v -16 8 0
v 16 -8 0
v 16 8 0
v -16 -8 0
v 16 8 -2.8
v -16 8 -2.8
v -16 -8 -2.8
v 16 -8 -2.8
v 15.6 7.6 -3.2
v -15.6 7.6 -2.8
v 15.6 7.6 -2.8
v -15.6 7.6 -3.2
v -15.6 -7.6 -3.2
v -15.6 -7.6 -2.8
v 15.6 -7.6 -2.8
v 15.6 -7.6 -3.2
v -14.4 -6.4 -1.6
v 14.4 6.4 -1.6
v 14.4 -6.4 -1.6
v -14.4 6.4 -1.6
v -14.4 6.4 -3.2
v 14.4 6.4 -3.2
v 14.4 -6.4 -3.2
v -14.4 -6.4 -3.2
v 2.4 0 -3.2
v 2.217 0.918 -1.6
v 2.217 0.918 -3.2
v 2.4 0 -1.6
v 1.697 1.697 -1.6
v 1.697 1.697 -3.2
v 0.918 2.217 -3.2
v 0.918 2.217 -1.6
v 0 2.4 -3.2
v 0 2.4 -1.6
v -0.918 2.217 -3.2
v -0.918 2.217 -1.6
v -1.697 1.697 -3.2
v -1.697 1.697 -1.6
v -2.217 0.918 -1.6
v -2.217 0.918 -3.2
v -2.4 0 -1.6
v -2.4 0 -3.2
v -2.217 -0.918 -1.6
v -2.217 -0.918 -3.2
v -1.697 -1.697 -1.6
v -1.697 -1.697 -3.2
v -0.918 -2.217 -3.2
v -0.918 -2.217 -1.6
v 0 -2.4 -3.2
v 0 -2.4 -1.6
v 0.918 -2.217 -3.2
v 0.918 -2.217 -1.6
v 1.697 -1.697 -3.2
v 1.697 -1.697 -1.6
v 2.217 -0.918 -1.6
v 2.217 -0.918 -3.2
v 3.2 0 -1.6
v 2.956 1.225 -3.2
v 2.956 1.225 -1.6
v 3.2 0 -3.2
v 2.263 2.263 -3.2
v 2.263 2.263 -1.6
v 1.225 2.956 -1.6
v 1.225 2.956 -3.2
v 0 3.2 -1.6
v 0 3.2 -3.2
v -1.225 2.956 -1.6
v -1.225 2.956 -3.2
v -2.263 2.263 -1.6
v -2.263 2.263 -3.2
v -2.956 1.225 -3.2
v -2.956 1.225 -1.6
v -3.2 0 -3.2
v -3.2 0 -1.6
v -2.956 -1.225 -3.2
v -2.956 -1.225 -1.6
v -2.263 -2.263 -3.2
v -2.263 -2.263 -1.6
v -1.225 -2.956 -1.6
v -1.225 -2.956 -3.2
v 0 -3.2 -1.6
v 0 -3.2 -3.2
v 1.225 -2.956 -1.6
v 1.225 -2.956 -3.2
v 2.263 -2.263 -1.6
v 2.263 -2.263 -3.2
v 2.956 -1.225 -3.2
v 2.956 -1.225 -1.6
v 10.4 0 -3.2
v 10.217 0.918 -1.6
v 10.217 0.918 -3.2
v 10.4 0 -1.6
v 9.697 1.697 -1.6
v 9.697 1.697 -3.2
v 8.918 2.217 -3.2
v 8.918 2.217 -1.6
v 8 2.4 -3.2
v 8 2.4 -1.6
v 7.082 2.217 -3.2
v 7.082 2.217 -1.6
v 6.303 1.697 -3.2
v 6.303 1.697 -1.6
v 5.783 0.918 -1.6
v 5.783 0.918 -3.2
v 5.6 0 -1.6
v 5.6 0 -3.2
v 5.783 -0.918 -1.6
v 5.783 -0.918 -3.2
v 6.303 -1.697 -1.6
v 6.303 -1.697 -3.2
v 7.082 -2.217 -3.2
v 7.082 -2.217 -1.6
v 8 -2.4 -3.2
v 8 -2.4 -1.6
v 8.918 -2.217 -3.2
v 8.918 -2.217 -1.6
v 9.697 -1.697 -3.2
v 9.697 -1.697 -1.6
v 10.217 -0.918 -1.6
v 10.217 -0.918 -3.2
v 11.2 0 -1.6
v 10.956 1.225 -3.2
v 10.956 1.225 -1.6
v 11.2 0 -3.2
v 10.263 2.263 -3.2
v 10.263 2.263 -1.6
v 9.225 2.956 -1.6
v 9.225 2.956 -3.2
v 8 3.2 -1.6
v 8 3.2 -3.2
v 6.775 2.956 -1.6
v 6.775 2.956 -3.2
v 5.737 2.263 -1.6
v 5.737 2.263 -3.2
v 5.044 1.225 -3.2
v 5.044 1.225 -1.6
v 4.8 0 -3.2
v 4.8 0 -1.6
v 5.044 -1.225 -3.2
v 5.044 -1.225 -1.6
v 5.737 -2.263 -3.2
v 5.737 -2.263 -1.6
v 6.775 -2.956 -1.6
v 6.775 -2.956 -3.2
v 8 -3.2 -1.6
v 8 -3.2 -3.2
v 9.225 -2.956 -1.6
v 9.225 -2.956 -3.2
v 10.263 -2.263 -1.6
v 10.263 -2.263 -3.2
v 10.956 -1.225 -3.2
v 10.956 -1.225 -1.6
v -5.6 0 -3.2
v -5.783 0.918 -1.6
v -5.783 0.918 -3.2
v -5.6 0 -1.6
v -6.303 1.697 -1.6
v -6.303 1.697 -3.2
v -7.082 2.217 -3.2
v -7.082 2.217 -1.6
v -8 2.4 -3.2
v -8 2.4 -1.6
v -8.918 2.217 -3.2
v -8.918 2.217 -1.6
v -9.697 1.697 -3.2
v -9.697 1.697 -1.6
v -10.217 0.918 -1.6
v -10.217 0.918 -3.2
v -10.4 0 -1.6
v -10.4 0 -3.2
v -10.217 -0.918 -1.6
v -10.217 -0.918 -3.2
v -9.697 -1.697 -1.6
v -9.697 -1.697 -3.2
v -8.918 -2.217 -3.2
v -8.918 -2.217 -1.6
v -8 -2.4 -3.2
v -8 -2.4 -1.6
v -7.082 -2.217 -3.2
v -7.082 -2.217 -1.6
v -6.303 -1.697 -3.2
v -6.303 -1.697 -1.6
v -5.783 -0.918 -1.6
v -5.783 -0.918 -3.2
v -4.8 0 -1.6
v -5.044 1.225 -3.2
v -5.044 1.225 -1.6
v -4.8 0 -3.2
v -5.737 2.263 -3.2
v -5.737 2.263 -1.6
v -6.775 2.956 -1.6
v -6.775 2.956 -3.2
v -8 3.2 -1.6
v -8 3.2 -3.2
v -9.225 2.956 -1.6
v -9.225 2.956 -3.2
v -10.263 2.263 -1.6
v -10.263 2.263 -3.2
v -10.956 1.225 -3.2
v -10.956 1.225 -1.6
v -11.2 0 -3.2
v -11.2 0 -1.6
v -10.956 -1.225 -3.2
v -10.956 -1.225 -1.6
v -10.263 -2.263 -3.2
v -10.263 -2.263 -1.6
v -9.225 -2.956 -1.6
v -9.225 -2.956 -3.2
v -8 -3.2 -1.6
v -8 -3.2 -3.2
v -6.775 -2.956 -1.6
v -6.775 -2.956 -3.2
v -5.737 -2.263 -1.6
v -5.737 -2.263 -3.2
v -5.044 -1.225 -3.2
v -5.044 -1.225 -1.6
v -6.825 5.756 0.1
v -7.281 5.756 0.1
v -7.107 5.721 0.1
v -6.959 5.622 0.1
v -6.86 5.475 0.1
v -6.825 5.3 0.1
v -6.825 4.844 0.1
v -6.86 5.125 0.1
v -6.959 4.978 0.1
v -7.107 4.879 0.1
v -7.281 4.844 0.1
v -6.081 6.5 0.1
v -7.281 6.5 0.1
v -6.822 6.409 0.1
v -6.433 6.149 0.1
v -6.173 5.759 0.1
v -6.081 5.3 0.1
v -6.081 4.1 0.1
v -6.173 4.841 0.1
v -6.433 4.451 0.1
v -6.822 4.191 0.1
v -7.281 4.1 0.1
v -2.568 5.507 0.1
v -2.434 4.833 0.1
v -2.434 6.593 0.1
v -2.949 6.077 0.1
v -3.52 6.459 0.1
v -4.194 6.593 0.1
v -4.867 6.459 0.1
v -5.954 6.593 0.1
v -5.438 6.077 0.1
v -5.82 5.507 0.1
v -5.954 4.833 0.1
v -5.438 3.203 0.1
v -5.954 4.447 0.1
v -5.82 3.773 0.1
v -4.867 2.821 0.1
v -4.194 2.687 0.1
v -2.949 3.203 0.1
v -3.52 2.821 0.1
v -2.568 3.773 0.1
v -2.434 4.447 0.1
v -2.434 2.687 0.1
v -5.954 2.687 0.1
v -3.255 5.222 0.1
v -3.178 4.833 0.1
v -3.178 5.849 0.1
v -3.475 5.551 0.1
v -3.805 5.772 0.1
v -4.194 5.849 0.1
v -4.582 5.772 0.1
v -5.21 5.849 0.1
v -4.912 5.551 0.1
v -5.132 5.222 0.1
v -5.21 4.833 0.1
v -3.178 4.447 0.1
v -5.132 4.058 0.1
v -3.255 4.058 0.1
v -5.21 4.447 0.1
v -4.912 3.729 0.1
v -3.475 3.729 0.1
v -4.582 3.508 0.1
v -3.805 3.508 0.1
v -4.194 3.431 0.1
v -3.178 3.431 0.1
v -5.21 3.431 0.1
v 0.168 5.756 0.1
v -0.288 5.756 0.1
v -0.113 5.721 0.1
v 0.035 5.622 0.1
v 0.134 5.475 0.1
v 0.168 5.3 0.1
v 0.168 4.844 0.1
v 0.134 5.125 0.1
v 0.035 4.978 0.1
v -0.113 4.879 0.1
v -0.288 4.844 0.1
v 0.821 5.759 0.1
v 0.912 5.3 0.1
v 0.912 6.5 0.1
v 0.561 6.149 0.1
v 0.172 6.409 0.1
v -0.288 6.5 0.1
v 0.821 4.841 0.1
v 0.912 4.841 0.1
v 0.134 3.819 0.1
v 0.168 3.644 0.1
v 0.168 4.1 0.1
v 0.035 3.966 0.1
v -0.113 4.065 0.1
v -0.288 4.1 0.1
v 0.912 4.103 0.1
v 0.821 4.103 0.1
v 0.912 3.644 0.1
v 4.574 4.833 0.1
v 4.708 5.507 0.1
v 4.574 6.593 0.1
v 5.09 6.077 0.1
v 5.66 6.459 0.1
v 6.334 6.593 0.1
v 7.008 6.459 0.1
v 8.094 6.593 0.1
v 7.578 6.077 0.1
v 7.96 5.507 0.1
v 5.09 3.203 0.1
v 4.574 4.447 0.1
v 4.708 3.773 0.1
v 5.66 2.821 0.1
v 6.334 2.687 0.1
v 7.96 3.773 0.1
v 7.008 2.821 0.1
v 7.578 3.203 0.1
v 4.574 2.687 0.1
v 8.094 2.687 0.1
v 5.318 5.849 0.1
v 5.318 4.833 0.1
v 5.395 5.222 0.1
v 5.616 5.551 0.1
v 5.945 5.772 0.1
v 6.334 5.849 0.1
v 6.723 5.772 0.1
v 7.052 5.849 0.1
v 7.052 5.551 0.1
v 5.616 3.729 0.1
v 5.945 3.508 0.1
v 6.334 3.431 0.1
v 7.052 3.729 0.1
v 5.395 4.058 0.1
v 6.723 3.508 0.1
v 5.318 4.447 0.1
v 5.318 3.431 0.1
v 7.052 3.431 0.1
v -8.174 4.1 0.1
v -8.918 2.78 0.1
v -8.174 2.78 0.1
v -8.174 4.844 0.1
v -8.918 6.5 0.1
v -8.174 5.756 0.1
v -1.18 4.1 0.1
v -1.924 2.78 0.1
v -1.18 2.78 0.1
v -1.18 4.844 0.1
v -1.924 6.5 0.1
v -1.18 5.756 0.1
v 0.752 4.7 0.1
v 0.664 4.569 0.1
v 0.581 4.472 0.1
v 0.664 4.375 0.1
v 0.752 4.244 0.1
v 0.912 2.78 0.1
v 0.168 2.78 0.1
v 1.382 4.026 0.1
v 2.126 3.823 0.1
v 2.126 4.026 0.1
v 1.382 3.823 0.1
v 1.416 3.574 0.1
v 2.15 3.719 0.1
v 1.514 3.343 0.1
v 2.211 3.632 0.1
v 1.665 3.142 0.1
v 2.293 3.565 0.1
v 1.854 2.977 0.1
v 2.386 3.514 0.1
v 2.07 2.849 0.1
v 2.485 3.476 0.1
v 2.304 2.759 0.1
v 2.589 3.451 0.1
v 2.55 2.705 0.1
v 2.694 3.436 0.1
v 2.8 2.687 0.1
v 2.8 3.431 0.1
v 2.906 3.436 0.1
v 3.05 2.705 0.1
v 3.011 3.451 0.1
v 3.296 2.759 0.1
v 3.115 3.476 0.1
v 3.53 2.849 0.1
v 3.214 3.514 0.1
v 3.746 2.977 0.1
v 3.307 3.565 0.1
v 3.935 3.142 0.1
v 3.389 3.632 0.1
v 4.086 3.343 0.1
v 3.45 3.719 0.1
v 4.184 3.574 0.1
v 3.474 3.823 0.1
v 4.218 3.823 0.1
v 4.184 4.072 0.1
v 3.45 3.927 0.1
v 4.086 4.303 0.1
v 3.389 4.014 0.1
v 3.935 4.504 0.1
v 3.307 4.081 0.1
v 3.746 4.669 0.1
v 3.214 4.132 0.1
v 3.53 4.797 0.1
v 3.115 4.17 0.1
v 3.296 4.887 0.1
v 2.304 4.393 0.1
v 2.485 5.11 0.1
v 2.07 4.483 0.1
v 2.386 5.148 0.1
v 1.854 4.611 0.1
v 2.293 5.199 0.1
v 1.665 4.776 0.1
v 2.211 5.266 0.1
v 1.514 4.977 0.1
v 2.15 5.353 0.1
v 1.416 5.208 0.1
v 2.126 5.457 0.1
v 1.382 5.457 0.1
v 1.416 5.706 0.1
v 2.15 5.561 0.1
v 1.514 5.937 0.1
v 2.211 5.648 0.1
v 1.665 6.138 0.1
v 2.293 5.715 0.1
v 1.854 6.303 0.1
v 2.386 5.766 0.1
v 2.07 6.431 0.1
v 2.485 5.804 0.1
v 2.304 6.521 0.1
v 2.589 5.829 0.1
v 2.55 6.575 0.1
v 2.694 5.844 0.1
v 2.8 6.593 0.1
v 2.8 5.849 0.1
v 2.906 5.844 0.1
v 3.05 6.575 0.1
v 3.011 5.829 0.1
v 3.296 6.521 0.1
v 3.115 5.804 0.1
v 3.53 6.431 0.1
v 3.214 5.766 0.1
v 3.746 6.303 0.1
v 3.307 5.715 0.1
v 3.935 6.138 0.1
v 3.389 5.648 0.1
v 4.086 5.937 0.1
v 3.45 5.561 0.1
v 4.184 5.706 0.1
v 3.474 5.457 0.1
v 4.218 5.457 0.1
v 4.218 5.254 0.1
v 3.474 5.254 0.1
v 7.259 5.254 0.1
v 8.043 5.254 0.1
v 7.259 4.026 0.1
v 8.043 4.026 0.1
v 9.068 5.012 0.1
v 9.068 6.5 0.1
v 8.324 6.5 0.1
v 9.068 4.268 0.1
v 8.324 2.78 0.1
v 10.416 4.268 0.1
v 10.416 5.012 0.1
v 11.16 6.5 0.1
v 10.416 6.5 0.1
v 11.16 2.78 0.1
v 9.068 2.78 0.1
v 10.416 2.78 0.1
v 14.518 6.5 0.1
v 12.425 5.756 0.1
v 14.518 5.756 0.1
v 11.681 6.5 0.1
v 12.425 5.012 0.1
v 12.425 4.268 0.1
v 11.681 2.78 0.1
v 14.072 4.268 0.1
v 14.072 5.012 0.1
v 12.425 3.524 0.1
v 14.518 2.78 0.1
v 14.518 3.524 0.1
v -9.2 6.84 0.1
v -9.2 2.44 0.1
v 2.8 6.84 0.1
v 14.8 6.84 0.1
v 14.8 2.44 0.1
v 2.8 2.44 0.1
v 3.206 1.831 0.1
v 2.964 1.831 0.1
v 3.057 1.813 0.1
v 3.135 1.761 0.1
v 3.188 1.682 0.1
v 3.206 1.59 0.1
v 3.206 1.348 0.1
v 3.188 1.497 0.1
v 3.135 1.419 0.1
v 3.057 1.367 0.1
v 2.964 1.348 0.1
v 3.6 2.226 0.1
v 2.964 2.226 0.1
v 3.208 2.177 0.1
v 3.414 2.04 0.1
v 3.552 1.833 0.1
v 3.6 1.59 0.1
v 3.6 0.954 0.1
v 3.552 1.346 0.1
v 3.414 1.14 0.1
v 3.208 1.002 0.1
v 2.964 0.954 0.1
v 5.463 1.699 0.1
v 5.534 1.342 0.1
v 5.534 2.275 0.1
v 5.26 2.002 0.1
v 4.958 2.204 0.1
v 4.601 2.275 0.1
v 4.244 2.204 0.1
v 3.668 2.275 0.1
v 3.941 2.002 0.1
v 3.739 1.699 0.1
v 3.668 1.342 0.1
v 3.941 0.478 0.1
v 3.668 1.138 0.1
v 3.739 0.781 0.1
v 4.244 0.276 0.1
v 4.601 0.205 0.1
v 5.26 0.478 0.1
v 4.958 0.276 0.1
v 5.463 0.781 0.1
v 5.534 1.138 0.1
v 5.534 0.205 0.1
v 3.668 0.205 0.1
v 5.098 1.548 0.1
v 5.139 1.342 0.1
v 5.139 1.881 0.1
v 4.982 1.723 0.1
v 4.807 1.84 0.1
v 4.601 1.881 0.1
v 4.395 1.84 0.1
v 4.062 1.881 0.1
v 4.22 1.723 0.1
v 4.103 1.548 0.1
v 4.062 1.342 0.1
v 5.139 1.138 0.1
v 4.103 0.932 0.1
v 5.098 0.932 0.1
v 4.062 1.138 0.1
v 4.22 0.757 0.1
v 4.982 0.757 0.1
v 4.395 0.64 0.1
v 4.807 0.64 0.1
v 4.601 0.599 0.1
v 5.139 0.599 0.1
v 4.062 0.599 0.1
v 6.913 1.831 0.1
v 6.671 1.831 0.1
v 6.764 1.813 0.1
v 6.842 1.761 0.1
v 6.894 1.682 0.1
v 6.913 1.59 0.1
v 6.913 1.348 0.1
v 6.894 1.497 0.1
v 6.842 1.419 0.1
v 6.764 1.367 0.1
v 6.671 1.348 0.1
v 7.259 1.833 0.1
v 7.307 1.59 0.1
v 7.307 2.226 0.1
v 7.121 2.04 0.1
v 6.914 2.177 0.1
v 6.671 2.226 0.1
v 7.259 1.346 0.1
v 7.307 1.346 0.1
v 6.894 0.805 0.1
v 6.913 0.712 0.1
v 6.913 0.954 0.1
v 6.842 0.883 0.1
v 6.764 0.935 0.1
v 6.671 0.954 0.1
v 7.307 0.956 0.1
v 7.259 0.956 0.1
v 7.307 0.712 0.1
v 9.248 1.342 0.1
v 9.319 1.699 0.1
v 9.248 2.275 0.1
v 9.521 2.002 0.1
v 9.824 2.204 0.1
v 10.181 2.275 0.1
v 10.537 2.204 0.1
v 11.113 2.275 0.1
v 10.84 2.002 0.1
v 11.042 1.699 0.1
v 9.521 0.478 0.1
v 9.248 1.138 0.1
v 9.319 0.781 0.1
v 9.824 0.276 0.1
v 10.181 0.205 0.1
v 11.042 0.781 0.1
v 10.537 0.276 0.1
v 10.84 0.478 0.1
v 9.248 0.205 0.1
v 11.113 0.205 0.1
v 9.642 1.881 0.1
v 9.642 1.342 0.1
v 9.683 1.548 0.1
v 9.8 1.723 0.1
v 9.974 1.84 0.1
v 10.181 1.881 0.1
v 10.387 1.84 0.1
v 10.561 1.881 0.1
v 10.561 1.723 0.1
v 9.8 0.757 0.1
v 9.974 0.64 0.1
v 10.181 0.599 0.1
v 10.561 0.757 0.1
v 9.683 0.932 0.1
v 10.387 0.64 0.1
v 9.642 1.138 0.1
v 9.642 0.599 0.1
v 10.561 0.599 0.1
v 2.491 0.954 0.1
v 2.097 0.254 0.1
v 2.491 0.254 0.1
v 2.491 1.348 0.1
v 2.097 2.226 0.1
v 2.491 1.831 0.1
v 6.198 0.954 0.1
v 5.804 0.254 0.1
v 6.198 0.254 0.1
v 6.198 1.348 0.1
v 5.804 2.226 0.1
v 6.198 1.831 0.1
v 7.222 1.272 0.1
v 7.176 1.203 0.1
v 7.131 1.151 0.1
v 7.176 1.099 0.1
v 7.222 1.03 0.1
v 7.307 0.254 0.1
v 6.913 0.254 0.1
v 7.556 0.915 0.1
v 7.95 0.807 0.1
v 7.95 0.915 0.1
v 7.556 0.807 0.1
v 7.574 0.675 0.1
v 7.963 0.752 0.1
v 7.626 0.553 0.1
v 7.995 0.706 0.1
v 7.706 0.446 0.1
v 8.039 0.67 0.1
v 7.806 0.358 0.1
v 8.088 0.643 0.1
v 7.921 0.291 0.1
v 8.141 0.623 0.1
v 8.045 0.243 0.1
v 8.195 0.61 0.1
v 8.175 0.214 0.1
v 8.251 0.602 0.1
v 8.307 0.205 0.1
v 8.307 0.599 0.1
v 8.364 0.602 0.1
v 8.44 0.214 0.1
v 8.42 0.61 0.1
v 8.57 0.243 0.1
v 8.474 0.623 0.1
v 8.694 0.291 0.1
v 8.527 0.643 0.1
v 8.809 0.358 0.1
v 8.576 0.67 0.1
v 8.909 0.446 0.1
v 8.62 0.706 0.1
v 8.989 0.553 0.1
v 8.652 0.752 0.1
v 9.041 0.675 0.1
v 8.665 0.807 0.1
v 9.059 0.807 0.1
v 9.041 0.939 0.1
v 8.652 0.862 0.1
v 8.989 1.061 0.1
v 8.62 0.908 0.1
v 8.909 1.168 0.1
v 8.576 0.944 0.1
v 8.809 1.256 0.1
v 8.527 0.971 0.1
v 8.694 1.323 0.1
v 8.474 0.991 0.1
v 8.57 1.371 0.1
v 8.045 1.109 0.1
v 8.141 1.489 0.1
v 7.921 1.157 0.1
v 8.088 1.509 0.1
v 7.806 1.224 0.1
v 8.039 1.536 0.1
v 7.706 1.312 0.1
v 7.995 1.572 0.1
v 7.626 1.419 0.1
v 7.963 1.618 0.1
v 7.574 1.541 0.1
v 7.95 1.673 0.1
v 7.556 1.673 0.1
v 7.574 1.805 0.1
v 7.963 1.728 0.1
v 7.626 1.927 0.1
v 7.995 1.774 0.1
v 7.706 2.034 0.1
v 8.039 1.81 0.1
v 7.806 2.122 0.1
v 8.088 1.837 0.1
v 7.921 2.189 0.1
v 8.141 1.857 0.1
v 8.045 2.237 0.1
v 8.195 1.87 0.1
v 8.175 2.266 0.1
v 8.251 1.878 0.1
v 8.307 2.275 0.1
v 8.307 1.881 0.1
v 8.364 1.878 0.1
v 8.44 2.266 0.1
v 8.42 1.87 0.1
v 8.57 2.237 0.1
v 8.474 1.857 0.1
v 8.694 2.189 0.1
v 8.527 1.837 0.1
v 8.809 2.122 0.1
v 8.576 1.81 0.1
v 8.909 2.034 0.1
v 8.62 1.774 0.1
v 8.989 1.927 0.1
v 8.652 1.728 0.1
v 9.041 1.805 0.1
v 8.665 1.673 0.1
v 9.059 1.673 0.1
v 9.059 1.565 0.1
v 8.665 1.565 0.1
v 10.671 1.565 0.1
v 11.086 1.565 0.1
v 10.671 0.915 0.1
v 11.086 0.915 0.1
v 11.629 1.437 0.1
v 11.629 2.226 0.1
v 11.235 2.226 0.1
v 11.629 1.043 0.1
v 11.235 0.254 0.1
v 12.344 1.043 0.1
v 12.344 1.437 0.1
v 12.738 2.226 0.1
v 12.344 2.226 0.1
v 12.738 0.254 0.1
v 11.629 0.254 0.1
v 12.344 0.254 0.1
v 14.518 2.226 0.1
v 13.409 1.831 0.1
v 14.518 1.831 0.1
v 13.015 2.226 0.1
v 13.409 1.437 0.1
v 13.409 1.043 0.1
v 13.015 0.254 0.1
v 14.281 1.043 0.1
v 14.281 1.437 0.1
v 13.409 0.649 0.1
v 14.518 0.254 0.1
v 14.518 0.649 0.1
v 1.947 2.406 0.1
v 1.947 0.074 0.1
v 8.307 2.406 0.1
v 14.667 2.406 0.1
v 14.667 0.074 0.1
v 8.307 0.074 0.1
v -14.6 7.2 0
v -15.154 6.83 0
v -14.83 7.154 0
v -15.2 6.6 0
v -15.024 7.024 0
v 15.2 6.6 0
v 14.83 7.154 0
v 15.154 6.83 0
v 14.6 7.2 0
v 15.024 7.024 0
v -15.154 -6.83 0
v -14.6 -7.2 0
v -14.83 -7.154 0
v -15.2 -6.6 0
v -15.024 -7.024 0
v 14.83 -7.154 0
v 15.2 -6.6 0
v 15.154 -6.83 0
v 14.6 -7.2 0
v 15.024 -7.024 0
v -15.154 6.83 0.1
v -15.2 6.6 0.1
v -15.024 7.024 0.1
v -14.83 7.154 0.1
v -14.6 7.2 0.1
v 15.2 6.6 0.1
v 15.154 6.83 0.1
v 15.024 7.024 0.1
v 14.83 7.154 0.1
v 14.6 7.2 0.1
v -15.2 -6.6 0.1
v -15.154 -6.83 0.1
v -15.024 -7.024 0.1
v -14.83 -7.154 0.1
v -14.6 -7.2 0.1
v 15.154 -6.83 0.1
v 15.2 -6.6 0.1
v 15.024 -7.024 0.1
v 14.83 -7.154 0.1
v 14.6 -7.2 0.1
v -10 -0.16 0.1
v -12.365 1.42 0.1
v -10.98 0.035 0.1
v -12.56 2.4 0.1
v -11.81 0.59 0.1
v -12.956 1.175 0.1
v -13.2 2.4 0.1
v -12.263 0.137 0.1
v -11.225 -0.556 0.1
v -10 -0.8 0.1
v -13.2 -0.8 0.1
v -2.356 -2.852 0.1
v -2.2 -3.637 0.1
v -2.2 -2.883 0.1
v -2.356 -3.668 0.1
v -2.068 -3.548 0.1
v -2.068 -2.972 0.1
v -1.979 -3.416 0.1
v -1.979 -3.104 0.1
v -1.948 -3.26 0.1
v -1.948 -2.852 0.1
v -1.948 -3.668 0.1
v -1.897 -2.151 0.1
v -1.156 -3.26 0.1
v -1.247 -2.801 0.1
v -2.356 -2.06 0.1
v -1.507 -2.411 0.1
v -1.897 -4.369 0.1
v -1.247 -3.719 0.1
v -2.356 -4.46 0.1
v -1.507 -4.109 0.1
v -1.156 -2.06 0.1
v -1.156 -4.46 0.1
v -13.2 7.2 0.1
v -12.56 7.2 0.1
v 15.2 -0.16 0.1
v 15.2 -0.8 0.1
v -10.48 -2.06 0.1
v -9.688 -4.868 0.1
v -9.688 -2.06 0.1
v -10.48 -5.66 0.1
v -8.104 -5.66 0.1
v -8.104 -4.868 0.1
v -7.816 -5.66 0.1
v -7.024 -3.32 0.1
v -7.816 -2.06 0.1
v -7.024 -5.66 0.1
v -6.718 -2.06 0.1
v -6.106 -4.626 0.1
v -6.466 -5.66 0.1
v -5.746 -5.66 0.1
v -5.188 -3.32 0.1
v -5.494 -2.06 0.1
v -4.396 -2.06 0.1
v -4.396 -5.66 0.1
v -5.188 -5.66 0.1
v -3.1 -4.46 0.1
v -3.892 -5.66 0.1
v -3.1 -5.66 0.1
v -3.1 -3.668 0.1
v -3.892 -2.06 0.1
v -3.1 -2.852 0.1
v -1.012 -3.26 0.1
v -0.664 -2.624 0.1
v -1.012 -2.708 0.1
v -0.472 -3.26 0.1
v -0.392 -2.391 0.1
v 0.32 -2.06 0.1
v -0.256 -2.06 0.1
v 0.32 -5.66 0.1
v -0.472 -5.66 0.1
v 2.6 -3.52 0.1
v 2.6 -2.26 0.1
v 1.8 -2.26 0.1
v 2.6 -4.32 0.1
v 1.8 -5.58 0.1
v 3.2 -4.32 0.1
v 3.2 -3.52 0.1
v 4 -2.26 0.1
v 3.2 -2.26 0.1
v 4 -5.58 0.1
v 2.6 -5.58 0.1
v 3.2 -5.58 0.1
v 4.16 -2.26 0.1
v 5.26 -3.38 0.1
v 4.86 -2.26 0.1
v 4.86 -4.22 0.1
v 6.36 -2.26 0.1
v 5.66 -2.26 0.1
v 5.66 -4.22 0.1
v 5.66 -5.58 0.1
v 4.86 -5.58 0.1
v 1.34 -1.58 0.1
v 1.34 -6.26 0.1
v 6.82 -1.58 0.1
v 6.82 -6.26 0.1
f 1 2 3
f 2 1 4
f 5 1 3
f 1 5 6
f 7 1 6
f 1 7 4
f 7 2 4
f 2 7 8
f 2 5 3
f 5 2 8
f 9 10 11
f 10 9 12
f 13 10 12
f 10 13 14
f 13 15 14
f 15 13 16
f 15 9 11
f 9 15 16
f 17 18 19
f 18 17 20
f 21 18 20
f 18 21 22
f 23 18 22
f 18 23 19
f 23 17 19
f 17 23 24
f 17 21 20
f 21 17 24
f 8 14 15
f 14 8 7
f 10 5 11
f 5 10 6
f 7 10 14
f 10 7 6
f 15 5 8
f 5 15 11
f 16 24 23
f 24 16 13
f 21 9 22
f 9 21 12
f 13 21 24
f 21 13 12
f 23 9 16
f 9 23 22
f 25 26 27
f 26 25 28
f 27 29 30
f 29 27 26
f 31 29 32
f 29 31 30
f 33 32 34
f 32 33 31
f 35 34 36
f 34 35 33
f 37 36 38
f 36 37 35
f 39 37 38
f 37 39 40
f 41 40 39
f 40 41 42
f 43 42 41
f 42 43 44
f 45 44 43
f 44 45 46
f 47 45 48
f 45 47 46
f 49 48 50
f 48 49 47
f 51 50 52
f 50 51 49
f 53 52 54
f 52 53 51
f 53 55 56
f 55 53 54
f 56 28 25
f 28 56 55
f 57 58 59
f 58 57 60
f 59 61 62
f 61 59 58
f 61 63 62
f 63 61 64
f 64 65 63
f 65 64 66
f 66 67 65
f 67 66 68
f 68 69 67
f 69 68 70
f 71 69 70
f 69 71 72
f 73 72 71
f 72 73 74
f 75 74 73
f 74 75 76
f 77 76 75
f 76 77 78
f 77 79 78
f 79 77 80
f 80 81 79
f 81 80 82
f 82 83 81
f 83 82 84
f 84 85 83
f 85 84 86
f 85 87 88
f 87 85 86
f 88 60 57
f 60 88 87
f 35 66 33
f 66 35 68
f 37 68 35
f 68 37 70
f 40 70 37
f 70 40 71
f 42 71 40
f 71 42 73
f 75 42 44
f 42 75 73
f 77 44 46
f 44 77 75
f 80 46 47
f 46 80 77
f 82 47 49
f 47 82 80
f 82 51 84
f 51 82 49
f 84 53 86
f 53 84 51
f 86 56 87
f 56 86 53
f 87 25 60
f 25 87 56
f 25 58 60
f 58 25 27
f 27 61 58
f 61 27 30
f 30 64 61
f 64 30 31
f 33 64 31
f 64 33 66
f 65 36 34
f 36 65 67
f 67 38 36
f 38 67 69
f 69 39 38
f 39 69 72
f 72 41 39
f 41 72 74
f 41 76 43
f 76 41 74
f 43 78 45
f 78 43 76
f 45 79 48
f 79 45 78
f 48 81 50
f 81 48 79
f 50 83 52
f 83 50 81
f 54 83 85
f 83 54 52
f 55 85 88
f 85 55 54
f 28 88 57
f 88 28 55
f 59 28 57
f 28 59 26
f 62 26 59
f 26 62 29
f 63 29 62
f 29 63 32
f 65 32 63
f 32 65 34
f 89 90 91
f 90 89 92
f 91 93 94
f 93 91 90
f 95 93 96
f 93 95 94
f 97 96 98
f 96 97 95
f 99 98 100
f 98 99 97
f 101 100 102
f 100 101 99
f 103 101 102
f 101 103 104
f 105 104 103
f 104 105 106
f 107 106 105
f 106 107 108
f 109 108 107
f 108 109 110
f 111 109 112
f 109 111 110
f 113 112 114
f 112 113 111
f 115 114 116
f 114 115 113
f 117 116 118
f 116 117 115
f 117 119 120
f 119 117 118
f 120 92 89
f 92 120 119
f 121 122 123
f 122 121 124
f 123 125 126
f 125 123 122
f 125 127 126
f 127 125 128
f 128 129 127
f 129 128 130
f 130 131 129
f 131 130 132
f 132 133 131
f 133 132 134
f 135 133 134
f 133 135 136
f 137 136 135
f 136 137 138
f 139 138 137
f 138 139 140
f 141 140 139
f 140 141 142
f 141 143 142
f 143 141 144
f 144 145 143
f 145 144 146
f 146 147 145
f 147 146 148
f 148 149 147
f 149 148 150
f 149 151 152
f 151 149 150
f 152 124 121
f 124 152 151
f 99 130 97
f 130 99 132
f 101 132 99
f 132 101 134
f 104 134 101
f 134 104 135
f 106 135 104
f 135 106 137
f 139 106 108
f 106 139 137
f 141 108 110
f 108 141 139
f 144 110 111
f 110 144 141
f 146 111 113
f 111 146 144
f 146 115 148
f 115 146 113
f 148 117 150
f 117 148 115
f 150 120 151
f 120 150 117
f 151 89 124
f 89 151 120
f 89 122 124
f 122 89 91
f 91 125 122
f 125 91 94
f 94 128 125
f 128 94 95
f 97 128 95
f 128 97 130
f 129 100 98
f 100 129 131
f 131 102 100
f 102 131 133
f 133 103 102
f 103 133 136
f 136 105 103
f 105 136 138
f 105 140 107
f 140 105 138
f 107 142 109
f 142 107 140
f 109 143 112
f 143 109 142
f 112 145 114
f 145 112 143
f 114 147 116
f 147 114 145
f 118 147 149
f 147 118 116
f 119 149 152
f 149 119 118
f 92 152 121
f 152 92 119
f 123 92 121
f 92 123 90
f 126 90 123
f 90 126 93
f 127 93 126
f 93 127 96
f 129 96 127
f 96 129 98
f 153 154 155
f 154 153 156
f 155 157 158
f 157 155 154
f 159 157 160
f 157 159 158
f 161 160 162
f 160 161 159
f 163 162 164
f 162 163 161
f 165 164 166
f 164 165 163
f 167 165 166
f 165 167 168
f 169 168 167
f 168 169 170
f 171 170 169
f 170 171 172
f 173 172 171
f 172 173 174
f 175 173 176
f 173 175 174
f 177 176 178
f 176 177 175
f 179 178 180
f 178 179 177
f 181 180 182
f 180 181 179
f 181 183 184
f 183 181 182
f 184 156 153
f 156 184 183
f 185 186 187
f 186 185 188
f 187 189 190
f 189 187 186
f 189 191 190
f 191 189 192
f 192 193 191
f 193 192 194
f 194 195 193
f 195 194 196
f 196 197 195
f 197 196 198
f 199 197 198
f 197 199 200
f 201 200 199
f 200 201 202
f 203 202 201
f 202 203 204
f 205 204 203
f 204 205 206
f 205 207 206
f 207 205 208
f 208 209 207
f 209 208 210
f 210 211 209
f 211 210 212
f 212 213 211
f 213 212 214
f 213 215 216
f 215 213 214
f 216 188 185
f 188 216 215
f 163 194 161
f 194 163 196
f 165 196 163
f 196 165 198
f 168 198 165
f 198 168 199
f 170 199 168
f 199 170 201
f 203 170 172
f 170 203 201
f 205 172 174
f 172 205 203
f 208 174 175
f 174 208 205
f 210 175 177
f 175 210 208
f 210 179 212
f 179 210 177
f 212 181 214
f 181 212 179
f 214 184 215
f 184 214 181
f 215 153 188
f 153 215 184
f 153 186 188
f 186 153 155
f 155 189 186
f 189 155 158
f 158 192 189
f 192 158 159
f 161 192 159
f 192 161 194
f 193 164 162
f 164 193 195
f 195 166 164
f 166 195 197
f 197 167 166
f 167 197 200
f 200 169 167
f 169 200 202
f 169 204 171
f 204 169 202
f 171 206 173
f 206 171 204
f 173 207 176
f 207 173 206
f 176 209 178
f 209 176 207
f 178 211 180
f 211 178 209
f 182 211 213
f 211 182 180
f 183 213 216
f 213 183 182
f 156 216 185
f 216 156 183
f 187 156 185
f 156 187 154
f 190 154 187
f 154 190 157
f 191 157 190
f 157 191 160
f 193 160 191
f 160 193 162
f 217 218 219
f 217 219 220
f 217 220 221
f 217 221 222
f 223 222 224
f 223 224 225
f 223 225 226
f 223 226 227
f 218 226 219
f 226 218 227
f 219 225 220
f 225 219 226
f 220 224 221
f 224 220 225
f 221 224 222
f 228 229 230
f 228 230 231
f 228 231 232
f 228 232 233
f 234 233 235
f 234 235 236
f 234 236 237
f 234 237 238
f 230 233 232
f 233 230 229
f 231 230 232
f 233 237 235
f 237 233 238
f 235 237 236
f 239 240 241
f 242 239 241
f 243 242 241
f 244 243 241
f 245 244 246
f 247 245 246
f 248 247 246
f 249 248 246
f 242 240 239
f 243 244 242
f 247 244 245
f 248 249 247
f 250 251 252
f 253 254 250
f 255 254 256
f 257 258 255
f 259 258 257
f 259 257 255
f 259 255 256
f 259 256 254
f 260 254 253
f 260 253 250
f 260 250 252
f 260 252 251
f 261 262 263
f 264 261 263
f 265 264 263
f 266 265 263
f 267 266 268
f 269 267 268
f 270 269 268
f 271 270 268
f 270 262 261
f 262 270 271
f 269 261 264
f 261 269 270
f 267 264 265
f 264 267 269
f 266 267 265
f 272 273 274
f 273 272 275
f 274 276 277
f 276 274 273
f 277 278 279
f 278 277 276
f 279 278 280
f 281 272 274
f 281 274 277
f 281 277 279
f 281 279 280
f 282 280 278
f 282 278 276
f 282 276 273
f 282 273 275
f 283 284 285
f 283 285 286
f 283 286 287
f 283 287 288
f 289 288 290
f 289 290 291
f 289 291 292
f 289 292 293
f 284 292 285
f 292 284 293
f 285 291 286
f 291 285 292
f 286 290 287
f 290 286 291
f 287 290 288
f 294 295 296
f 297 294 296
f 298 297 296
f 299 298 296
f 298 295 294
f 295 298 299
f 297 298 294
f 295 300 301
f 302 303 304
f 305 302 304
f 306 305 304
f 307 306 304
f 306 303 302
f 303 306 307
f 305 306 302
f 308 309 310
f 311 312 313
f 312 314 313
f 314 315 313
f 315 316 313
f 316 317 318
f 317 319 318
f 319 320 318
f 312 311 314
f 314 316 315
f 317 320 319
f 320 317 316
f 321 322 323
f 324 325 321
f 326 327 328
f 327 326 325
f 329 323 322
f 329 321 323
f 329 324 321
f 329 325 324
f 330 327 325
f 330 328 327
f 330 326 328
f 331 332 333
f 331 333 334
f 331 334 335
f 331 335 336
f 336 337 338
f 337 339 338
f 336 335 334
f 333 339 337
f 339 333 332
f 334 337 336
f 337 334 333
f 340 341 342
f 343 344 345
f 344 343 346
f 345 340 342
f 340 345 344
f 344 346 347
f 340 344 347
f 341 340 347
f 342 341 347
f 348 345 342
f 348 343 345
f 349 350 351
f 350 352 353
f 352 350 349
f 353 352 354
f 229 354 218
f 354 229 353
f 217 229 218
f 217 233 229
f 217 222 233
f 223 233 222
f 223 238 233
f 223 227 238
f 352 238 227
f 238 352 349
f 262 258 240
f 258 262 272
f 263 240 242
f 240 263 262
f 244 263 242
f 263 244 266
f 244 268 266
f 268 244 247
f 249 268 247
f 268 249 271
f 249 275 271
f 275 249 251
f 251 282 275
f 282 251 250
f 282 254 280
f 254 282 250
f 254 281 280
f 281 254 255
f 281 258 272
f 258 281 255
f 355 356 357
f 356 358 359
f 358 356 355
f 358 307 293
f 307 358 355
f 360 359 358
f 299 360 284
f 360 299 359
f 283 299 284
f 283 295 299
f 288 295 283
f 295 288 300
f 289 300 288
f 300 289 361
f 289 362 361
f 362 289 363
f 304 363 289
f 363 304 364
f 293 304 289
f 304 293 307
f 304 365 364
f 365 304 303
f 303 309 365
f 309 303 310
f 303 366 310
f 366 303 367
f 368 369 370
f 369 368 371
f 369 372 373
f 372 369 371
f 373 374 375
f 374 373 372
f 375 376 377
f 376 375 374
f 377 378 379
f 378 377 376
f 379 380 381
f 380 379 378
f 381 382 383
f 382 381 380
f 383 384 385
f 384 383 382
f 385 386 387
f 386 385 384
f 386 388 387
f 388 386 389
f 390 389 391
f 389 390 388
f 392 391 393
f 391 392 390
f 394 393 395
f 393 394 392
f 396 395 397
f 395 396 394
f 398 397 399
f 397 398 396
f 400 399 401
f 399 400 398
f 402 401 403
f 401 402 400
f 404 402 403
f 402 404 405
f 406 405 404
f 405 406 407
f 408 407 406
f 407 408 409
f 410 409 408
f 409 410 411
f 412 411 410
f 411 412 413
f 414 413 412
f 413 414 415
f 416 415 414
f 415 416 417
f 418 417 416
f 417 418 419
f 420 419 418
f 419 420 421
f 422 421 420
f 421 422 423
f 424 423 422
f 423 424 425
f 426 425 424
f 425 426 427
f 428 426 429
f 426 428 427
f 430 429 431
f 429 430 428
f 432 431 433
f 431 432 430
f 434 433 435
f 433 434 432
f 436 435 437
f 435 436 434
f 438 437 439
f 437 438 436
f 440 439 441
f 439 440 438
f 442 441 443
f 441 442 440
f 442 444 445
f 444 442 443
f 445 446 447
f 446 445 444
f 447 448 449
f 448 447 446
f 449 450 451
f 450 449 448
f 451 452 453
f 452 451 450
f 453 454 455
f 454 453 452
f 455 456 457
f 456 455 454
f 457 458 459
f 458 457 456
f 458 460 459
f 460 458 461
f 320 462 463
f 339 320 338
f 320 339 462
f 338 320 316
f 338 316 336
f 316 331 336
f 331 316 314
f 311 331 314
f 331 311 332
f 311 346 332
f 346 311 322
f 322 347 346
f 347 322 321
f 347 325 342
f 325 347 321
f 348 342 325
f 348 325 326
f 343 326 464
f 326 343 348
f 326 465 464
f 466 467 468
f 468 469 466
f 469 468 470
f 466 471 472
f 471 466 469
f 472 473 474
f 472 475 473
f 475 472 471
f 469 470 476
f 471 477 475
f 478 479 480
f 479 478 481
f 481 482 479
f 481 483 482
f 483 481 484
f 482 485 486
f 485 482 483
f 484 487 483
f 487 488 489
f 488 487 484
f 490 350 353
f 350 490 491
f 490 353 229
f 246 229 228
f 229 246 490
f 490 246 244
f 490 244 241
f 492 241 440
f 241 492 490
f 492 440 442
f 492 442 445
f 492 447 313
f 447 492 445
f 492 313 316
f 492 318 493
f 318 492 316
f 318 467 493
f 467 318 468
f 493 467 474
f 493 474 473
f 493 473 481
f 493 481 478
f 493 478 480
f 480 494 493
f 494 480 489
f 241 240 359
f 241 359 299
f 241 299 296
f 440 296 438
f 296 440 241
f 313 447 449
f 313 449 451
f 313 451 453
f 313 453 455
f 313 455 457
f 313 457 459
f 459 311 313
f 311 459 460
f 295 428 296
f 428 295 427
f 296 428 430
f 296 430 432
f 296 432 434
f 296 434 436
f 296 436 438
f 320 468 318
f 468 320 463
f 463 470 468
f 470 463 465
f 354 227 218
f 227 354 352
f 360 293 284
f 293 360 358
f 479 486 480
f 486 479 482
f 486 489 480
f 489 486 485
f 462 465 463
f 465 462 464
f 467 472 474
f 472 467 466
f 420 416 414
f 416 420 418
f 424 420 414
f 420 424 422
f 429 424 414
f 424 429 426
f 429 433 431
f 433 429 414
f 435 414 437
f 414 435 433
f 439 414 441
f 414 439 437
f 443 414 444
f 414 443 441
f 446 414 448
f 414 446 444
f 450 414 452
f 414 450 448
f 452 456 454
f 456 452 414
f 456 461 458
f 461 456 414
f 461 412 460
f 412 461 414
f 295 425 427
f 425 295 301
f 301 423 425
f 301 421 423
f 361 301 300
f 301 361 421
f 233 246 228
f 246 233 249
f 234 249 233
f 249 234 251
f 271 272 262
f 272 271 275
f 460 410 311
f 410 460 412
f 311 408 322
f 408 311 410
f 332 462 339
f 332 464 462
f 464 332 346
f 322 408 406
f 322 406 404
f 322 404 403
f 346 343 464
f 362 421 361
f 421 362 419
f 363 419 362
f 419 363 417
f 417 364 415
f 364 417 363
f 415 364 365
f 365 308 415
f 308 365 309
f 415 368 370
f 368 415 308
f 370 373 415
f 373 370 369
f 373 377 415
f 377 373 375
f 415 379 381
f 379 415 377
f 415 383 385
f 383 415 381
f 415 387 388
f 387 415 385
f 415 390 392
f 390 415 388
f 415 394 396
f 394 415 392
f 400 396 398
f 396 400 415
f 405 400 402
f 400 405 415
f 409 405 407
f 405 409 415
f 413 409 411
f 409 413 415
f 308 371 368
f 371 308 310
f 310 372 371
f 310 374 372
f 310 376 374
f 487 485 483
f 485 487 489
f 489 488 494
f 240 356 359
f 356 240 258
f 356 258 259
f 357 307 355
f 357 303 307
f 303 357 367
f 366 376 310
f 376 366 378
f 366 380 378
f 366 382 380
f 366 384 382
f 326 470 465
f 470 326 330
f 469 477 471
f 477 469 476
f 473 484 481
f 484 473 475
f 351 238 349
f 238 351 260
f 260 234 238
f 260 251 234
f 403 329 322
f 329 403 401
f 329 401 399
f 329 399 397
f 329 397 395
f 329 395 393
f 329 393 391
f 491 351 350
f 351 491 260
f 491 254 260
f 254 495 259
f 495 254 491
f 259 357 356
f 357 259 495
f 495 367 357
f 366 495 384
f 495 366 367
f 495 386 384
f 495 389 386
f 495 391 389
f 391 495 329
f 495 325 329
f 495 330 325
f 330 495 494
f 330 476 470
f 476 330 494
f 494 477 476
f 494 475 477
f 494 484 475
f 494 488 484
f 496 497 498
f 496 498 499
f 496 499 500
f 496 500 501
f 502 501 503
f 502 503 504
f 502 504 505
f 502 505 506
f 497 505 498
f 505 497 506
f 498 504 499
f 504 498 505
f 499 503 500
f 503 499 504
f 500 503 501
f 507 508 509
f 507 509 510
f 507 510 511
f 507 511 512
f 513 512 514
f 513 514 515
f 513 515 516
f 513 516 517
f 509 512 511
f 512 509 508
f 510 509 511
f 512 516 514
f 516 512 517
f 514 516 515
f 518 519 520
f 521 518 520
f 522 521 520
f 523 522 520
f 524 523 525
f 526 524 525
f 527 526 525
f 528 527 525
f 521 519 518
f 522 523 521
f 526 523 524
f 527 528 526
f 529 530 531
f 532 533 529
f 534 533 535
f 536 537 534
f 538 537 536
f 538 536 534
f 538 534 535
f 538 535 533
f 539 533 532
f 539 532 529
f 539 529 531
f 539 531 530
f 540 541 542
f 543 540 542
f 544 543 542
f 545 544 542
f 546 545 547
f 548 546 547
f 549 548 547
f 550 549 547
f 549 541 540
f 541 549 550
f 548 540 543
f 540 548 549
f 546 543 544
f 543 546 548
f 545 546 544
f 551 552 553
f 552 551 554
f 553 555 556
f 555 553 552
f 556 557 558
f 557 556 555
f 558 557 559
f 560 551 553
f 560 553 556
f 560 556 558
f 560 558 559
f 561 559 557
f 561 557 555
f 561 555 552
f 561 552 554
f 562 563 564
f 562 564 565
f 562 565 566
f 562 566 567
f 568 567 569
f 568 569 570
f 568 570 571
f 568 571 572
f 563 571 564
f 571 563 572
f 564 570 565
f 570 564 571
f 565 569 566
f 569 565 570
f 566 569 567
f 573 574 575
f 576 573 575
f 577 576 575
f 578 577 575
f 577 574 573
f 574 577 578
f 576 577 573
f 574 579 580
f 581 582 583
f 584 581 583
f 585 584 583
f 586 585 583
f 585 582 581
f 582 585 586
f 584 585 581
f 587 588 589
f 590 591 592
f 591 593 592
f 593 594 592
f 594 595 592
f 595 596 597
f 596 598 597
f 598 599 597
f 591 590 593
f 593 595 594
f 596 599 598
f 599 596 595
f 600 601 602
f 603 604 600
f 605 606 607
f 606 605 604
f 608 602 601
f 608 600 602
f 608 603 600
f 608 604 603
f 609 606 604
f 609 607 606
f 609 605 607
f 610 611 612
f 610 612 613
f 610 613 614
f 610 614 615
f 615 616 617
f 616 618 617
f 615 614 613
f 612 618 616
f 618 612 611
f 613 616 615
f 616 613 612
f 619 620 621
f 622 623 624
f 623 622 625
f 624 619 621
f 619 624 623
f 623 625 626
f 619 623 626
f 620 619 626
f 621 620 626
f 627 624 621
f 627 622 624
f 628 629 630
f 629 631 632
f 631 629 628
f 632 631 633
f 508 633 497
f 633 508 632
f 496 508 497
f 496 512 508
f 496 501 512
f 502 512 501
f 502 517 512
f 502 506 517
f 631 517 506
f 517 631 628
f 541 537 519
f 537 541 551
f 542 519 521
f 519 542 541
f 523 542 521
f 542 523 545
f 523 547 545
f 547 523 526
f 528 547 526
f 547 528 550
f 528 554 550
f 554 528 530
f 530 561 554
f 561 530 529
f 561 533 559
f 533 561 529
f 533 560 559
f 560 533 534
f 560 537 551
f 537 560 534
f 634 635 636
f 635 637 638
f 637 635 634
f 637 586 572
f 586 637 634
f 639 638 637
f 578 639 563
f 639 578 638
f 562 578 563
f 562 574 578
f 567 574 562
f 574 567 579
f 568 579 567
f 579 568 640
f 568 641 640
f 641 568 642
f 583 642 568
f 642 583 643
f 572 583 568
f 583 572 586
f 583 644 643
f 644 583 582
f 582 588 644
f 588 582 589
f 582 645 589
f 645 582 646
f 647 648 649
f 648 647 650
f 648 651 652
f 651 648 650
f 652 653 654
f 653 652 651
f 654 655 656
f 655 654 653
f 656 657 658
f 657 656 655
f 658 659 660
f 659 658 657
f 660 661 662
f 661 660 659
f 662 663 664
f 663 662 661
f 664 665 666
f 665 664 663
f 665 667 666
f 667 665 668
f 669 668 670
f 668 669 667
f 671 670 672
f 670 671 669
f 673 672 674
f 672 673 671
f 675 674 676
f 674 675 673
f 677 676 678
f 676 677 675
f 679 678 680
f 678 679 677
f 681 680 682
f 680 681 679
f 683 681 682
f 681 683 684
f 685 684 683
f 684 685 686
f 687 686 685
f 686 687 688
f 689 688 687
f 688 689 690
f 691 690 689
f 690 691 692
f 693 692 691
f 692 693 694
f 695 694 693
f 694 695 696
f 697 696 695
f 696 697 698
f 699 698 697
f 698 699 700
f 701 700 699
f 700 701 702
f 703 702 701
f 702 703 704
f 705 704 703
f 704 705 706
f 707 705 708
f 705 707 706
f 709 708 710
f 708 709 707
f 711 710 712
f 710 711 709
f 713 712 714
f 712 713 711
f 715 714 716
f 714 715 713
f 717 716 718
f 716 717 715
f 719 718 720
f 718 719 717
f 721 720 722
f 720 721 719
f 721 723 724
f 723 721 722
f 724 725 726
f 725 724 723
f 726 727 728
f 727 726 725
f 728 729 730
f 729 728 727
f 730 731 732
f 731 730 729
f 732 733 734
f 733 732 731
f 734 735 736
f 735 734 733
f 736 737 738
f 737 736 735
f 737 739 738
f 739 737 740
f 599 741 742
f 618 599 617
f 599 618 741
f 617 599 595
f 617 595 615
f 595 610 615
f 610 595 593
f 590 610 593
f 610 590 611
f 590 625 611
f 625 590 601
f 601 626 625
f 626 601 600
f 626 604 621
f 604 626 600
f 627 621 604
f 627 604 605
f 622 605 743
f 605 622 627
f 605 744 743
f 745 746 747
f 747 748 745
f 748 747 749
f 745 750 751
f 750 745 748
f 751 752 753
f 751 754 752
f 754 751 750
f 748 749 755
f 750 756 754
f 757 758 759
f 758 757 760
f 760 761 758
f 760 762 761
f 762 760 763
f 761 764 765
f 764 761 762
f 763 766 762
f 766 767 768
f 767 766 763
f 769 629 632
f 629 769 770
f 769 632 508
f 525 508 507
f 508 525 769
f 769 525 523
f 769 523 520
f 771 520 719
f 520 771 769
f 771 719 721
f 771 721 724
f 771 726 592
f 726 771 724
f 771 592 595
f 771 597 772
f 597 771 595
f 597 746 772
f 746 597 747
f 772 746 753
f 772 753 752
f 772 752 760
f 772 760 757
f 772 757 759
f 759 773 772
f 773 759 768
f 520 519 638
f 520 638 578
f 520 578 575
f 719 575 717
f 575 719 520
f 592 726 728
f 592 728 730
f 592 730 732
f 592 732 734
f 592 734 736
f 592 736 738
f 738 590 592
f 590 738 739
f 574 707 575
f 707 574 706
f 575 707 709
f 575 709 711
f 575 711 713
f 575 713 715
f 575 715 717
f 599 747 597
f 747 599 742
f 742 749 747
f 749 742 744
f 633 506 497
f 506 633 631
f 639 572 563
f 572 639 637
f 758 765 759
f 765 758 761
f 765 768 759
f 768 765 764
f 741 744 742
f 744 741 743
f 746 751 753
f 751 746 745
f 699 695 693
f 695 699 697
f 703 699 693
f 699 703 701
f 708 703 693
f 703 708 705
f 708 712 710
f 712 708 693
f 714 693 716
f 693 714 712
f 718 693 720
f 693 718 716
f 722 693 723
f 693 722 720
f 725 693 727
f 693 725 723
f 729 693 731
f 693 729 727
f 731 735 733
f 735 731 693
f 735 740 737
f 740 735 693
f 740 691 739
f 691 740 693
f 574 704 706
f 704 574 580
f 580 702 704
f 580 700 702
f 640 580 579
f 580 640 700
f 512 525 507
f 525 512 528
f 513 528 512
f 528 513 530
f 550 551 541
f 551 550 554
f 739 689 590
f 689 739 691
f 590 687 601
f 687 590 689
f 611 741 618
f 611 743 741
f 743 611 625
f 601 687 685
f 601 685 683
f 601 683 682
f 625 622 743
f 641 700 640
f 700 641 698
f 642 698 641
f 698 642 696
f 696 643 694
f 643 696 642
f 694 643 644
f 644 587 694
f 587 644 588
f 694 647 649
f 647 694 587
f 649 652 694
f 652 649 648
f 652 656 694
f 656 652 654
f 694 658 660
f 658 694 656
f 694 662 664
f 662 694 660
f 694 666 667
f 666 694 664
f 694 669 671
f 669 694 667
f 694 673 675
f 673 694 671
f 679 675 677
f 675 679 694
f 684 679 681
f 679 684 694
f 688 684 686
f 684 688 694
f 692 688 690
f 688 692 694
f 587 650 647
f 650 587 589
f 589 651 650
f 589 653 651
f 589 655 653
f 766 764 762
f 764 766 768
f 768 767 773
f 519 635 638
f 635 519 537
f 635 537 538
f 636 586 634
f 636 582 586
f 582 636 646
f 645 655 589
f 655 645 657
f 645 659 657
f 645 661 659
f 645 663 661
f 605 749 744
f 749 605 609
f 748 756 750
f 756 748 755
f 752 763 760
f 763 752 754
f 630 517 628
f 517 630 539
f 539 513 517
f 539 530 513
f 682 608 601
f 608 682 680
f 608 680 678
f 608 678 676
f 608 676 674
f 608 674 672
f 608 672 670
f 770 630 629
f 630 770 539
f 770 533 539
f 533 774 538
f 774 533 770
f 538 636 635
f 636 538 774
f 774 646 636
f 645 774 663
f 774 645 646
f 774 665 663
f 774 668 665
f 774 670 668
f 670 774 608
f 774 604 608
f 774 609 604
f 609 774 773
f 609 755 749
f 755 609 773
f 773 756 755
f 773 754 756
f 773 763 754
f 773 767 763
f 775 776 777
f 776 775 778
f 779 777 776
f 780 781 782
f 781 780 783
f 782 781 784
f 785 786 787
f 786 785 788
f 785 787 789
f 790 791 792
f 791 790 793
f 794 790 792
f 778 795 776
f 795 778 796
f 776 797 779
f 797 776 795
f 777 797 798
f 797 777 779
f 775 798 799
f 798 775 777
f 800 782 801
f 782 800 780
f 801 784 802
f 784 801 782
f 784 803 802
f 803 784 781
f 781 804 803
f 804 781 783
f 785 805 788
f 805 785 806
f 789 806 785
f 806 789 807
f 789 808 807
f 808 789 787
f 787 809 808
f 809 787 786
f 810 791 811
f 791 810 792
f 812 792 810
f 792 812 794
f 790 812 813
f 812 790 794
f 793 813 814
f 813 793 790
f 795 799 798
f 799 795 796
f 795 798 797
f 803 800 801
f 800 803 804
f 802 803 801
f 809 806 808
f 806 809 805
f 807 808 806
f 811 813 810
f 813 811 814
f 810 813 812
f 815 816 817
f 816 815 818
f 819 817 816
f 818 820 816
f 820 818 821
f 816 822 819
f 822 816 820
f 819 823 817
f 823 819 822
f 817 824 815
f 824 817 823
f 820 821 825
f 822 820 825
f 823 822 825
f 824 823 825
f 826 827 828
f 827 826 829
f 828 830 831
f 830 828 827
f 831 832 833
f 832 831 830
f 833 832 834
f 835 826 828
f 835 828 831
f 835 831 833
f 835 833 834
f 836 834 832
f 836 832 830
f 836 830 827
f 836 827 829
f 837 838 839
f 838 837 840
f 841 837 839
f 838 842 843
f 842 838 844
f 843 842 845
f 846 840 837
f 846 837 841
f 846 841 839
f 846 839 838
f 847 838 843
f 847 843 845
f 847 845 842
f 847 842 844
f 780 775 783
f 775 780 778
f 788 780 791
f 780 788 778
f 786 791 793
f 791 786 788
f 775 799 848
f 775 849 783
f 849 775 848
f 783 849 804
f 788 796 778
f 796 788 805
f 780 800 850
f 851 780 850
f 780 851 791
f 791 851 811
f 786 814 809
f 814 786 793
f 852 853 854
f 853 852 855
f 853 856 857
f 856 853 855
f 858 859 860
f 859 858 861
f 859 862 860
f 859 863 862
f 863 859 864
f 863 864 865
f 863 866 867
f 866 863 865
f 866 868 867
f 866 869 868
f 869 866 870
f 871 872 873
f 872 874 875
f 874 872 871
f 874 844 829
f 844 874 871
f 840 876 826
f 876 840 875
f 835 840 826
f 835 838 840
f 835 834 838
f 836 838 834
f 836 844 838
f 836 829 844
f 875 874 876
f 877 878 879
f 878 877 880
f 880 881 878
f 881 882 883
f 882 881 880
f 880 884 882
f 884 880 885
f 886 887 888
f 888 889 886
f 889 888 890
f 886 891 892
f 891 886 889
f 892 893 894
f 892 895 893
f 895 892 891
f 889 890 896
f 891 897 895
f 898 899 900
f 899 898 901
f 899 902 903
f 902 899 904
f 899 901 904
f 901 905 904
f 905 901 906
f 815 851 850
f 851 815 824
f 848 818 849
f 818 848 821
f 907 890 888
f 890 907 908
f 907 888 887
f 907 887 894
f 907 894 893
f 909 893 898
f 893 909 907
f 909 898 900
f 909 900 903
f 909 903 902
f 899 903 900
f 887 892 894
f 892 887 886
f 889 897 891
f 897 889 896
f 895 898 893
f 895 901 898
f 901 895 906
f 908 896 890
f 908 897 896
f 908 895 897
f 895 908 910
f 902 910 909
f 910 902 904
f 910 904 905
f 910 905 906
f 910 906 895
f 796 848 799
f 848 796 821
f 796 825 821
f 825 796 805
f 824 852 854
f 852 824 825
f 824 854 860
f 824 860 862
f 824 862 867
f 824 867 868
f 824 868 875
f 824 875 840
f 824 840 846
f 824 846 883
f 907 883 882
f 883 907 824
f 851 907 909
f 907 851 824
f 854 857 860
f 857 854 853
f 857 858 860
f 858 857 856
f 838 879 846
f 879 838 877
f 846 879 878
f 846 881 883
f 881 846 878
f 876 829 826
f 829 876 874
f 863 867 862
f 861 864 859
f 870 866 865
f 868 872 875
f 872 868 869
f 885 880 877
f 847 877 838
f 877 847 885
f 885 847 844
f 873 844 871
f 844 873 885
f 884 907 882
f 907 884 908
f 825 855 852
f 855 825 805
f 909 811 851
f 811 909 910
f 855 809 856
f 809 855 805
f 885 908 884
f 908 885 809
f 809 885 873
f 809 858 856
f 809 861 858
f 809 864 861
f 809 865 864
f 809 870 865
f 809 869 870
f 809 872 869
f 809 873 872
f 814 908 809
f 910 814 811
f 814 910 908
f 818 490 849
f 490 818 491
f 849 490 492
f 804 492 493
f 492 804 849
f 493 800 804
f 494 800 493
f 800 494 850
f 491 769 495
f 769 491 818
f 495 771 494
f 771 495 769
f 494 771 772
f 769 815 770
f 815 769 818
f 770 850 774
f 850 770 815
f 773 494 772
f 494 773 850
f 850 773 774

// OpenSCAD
use <../lib.scad>
use <6148328b.scad>
use <87079.scad>
function ldraw_lib__87079d0y() = [
// 0 Tile  2 x  4 with White "PORSCHE LMP1 HY" on Blue and Red Background Sticker
// 0 Name: 87079d0y.dat
// 0 Author: Vincent Messenet [Cheenzo]
// 0 !LDRAW_ORG Shortcut UPDATE 2026-05
// 0 !LICENSE Licensed under CC BY 4.0 : see CAreadme.txt
// 
// 0 BFC CERTIFY CCW
  [0,"BFC","CERTIFY"],
  [0,"BFC","CCW"],
// 
// 0 !CATEGORY Sticker Shortcut
// 
// 0 !KEYWORDS Bricklink 87079pb0534, Porsche 919 Hybrid and 917K Pit Lane
// 0 !KEYWORDS set 75876, Speed Champions
// 
// 0 !HISTORY 2026-05-31 [OrionP] Official Update 2026-05
// 
// 1 16 0 0 0 1 0 0 0 1 0 0 0 1 87079.dat
  [1,16,0,0,0,1,0,0,0,1,0,0,0,1, ldraw_lib__87079()],
// 1 16 0 0 0 1 0 0 0 1 0 0 0 1 6148328b.dat
  [1,16,0,0,0,1,0,0,0,1,0,0,0,1, ldraw_lib__6148328b()],
];
module ldraw_lib__87079d0y(step=0, col=false, unit=2/5, alt=false, line=0.2, solid=!$preview)
    makepoly(ldraw_lib__87079d0y(), step=step, col=col, unit=unit, alt=alt, line=line, solid=solid);
ldraw_lib__87079d0y(line=0.2);
